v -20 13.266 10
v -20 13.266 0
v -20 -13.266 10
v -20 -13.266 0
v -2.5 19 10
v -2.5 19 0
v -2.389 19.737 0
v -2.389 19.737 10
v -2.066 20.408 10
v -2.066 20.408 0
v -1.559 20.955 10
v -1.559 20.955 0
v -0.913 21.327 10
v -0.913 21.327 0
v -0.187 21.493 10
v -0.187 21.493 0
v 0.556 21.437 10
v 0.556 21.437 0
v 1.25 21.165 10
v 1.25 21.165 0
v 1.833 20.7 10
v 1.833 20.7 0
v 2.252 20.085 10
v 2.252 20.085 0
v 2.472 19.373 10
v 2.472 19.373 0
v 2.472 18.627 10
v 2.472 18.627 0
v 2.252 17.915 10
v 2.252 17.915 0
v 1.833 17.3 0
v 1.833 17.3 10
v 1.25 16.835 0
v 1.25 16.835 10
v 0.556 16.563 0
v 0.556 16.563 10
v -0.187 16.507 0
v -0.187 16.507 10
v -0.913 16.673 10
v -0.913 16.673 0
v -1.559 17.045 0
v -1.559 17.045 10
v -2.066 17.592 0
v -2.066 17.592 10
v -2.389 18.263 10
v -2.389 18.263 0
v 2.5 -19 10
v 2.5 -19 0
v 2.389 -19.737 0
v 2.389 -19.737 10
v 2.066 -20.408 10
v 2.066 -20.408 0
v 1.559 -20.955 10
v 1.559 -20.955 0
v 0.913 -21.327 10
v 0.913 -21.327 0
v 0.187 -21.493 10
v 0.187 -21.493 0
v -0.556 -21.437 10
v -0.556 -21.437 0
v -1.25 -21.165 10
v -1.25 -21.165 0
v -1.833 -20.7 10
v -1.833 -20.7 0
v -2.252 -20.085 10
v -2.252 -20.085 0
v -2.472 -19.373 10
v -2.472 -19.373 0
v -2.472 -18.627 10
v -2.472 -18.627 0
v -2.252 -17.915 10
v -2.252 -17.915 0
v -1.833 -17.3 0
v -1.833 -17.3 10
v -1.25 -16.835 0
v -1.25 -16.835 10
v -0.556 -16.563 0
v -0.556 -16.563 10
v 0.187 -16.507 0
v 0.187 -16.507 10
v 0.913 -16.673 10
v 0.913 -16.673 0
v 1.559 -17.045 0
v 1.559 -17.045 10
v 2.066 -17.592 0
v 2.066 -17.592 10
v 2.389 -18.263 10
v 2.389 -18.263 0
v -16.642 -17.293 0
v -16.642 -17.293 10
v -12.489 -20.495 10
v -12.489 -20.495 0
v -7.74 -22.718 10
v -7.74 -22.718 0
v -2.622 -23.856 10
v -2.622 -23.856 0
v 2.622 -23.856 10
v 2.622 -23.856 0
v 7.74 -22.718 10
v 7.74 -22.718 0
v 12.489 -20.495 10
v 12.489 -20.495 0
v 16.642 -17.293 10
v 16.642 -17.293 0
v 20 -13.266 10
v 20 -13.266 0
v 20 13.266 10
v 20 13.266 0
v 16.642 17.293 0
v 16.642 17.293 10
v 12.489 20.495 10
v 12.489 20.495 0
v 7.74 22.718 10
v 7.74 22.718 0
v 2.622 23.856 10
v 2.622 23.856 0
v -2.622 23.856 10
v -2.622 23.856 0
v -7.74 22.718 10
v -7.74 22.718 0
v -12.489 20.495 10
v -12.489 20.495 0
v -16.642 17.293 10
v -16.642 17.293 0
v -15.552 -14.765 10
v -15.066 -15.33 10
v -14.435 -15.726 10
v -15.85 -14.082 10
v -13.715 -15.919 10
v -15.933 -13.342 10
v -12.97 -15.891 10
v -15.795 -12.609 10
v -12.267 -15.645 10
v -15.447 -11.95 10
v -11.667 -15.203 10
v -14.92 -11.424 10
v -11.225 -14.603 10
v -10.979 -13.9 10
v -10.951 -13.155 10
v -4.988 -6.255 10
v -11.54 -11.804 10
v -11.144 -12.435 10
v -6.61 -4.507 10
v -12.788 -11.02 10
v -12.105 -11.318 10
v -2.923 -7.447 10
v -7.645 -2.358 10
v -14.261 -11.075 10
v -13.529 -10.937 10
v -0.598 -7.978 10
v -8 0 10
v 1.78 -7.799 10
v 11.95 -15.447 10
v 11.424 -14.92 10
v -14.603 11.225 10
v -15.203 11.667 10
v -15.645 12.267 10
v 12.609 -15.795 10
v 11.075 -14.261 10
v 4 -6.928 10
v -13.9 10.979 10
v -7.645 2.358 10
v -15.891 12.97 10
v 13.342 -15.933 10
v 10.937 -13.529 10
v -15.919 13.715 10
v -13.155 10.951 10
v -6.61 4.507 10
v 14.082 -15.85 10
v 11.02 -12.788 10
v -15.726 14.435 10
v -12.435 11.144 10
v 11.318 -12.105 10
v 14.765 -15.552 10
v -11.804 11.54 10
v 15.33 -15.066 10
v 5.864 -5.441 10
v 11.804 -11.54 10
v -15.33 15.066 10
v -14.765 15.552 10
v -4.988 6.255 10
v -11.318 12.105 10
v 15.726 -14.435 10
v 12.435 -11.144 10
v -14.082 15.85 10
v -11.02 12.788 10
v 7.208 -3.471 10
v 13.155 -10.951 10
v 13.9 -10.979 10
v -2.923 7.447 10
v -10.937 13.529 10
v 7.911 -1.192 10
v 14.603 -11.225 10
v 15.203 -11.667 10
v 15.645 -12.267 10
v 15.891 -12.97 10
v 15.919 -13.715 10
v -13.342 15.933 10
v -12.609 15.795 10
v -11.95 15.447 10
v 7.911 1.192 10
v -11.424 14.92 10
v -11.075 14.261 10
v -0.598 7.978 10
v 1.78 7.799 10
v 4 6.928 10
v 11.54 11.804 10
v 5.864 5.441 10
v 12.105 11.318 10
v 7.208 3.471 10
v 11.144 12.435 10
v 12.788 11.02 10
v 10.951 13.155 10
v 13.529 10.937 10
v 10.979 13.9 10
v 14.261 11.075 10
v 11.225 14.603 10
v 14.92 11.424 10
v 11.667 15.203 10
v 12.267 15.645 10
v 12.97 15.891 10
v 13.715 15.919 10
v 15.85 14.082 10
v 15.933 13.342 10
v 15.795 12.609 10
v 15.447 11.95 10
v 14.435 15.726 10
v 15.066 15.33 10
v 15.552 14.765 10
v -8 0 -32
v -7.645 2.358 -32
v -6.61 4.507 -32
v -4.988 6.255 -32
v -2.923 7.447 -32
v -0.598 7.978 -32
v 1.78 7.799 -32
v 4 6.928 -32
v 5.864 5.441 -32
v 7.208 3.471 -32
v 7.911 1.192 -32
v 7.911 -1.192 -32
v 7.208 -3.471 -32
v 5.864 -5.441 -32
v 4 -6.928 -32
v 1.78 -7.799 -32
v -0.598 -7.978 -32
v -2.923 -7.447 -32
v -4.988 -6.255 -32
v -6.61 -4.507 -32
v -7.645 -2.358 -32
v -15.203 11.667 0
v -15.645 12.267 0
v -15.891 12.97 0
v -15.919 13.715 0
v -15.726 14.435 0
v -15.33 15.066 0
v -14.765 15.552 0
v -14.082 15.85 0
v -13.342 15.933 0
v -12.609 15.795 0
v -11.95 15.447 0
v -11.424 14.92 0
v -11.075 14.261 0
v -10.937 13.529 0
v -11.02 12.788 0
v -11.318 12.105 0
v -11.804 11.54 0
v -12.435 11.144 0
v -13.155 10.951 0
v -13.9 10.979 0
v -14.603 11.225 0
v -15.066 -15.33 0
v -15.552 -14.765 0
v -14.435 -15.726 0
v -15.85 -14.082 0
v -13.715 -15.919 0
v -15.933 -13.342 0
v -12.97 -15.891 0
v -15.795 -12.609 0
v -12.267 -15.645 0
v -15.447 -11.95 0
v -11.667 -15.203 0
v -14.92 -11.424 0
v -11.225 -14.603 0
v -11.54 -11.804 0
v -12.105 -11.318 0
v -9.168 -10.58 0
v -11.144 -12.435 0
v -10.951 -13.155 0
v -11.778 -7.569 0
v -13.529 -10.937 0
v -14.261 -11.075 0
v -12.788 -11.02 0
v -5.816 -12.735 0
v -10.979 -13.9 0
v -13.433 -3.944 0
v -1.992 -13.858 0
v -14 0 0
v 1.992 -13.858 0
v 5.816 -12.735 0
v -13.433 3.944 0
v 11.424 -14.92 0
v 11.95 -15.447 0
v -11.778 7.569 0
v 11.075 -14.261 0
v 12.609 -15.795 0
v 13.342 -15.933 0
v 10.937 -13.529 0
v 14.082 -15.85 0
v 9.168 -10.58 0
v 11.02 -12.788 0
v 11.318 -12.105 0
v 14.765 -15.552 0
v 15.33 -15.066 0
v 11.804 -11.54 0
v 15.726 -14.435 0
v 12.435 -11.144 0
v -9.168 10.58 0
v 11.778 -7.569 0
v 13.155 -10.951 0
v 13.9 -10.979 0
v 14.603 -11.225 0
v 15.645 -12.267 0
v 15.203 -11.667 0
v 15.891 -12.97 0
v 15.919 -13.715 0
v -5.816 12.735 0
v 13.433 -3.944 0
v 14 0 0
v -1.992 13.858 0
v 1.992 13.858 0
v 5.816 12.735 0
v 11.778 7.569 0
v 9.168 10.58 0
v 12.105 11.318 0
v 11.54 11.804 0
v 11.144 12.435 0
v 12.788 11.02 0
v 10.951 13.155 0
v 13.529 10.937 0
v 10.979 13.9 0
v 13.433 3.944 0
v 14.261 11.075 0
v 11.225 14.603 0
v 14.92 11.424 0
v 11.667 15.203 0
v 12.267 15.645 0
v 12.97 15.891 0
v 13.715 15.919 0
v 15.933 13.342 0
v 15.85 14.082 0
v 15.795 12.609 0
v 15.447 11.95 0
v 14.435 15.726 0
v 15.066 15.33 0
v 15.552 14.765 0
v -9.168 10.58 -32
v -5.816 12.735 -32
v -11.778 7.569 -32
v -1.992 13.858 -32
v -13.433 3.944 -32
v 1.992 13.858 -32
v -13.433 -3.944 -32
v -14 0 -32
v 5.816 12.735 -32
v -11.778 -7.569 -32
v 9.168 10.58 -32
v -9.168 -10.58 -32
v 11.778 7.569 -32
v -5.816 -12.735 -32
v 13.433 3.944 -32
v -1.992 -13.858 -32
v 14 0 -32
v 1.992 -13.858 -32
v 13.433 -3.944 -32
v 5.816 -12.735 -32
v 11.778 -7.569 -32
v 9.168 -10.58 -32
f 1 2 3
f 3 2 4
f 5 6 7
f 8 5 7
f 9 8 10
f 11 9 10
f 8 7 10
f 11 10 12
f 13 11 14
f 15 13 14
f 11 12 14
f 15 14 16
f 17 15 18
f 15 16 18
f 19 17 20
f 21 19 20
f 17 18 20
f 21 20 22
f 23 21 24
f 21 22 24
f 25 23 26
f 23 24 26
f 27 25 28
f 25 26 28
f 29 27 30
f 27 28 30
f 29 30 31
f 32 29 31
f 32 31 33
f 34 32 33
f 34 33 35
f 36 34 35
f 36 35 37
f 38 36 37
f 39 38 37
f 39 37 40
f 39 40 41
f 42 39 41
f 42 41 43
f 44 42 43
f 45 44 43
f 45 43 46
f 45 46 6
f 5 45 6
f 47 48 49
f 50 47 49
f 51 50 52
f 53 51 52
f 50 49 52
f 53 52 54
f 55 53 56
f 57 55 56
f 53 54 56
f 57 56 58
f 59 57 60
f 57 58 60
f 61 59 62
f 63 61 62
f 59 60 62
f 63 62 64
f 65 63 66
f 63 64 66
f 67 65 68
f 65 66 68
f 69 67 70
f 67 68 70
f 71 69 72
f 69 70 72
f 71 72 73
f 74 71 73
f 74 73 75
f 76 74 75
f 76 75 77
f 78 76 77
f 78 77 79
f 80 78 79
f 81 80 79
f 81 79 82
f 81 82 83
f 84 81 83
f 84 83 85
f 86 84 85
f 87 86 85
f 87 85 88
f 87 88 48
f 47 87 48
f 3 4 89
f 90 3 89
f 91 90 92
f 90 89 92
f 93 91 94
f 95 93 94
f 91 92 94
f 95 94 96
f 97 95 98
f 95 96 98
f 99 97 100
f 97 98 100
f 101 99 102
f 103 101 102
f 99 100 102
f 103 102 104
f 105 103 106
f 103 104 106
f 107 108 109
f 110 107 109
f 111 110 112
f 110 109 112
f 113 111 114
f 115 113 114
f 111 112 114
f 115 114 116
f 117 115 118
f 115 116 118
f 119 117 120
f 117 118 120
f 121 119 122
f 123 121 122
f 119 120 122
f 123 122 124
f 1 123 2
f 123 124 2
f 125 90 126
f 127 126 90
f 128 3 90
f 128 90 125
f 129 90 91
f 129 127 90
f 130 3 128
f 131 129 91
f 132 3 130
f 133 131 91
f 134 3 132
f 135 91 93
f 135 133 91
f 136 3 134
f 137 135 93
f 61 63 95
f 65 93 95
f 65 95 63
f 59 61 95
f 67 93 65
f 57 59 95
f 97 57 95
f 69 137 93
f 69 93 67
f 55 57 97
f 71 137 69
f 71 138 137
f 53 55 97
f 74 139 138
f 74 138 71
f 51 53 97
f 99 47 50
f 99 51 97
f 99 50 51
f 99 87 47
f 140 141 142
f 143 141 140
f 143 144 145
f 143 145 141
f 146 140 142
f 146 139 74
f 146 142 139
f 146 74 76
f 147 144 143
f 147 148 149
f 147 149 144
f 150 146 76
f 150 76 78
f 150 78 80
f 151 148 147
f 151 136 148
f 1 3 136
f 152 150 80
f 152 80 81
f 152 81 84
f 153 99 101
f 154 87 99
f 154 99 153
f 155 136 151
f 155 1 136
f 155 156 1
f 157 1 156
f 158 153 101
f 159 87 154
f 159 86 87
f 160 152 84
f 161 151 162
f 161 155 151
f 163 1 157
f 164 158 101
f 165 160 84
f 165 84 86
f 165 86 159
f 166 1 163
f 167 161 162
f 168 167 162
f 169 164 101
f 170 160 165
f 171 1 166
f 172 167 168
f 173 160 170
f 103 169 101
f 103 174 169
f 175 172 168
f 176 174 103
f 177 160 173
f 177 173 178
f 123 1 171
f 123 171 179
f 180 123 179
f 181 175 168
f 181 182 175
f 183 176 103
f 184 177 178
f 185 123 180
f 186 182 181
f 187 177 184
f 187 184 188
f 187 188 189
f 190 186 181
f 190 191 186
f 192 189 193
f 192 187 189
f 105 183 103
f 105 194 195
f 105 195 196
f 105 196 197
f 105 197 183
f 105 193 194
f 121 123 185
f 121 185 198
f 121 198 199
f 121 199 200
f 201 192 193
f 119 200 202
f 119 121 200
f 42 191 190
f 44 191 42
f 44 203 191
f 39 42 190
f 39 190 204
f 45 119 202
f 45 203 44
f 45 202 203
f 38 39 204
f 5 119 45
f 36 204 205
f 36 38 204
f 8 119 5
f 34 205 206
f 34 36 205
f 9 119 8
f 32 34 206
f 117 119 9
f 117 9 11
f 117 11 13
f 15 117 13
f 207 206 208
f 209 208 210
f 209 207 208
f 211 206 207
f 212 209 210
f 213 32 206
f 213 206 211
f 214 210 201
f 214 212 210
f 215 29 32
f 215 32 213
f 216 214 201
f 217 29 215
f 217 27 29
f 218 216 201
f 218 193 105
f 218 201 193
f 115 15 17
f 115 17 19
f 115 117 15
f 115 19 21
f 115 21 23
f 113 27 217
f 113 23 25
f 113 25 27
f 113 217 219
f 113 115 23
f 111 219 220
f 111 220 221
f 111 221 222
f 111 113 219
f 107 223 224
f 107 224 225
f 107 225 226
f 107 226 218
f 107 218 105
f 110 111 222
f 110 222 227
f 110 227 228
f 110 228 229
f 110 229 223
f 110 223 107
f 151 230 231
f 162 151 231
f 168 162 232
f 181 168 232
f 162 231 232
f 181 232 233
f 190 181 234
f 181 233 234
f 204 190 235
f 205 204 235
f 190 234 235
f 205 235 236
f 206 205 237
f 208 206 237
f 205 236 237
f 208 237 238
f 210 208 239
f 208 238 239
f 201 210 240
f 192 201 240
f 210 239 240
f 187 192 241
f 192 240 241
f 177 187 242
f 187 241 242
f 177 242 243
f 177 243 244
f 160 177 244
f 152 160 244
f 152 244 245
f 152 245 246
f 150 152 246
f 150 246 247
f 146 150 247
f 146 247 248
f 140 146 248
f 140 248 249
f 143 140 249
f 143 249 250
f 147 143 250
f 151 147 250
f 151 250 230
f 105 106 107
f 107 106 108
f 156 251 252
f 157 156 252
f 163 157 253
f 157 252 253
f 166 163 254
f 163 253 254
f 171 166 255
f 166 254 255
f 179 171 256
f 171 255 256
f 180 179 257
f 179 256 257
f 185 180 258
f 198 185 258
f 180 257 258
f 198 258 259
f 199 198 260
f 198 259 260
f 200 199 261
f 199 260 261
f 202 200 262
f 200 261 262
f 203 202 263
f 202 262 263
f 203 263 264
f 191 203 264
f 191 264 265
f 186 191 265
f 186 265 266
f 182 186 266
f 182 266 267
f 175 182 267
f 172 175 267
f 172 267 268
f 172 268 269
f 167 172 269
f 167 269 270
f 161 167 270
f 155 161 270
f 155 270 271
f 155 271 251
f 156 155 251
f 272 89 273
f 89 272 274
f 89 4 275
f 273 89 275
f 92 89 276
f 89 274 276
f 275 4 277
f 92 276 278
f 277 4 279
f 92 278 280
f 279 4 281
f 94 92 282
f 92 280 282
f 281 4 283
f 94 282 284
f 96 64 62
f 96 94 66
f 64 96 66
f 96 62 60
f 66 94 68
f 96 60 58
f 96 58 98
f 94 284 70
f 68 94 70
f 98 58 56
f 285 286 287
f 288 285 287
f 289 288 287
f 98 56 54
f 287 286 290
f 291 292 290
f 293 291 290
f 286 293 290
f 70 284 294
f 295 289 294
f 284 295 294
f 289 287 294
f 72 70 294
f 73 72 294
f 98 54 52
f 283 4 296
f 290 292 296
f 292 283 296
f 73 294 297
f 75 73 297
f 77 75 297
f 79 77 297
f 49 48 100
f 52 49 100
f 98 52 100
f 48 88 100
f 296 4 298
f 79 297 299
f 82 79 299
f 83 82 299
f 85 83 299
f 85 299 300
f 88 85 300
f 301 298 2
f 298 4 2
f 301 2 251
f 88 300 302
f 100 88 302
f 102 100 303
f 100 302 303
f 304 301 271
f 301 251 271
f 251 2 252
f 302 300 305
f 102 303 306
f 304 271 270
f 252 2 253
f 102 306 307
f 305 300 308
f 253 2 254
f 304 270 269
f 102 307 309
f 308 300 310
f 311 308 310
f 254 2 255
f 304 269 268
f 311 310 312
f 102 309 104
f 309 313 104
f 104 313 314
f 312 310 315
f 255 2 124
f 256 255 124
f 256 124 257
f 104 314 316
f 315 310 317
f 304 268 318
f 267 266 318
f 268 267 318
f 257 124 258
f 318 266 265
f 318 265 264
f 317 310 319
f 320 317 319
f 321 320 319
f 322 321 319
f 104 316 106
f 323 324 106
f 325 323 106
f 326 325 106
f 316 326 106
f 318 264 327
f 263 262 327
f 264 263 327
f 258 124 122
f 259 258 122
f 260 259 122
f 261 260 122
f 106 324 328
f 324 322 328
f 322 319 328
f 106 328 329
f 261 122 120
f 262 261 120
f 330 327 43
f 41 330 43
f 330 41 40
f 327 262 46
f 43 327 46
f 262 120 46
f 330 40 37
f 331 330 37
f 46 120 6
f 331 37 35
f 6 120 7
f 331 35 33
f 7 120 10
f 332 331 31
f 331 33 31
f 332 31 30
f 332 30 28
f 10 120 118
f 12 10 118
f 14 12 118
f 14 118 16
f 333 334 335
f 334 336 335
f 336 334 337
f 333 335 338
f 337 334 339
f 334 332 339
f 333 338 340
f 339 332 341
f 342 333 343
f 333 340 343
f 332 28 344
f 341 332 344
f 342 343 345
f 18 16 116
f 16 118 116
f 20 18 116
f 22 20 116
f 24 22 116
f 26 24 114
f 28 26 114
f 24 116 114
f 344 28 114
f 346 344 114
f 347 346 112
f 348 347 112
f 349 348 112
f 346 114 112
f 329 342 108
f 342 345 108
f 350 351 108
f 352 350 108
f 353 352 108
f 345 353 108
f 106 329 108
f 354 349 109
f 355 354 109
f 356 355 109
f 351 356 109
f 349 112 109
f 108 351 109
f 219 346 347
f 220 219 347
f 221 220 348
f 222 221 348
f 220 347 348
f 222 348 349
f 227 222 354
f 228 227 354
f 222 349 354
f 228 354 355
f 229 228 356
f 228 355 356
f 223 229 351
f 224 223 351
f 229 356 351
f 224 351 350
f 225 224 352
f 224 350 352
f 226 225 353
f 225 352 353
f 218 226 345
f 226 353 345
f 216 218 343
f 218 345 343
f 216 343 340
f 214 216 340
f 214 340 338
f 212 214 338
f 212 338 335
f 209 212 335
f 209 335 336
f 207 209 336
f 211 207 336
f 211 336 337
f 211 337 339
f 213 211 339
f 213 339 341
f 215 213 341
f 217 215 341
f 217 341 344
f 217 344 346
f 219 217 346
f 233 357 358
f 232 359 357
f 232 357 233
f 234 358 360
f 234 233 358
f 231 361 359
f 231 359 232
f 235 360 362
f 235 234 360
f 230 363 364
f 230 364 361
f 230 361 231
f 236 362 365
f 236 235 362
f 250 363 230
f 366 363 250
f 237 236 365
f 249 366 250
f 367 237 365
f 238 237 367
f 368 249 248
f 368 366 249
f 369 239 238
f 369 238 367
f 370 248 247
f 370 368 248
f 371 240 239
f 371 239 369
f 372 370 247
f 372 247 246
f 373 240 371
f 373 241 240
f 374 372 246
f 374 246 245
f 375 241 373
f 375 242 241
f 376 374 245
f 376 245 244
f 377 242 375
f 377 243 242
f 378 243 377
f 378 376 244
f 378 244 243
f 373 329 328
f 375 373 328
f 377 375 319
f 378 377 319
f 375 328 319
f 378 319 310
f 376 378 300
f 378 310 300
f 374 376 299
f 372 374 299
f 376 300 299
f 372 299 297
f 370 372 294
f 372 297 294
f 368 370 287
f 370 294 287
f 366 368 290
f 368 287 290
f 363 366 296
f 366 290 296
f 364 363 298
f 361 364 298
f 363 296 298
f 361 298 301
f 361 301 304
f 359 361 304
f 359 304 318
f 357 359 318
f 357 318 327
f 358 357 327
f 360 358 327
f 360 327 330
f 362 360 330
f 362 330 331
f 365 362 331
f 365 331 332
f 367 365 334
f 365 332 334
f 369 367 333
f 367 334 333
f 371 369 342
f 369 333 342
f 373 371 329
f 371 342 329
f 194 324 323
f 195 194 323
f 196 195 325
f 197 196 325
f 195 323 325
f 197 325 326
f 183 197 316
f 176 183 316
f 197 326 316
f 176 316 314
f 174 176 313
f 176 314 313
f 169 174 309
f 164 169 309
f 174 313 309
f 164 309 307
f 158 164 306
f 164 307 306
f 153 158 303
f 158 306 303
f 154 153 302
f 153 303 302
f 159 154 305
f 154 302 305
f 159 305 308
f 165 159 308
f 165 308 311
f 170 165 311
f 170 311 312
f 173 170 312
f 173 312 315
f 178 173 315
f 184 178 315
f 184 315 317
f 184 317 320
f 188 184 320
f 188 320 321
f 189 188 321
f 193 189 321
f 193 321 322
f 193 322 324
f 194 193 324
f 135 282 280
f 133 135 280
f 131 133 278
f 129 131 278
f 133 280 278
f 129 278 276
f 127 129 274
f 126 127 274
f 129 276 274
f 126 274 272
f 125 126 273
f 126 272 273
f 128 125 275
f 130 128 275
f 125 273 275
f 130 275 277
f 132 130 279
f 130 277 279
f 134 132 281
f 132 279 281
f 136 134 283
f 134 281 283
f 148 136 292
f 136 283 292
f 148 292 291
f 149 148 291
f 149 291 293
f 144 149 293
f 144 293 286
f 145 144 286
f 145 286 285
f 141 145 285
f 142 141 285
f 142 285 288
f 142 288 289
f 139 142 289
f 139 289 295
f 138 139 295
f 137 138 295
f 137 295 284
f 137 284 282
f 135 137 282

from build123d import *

# Parameters (mm, degrees)
BOSS_EXTRUDE1_DEPTH   = 10
SKETCH2_R             = 14
BOSS_EXTRUDE2_DEPTH   = 32
SKETCH3_R             = 8
CUT_EXTRUDE1_DEPTH    = 53.345009313
F_5_0MM_DOWEL_HOLE1_D = 5
CIRPATTERN1_COUNT     = 8


with BuildPart() as part:
    # Sketch1 → Boss-Extrude1 (new body)
    with BuildSketch(Plane.XY):
        with BuildLine():
            Line((-20, 13.266499161), (-20, -13.266499161))
            ThreePointArc((-20, -13.266499161), (0, -24), (20, -13.266499161))
            Line((20, -13.266499161), (20, 13.266499161))
            ThreePointArc((20, 13.266499161), (0, 24), (-20, 13.266499161))
        make_face()
    extrude(amount=BOSS_EXTRUDE1_DEPTH)

    # Sketch2 → Boss-Extrude2 (add)
    with BuildSketch(Plane(origin=(0, 0, 0), x_dir=(-1, 0, 0), z_dir=(0, 0, -1))):
        with Locations(Location((0, 0, 0), (0, 0, 180))):
            Circle(SKETCH2_R)
    extrude(amount=BOSS_EXTRUDE2_DEPTH)

    # Sketch3 → Cut-Extrude1 (cut, through all)
    with BuildSketch(Plane(origin=(0, 0, -32), x_dir=(-1, 0, 0), z_dir=(0, 0, -1))):
        Circle(SKETCH3_R)
    extrude(amount=-CUT_EXTRUDE1_DEPTH, mode=Mode.SUBTRACT)

    # Ø5.0mm Dowel Hole1 (through all)
    with Locations(Plane.XY.offset(10)):
        with Locations((0, 19)):
            f_5_0mm_dowel_hole1 = Hole(F_5_0MM_DOWEL_HOLE1_D / 2)

    # CirPattern1: Ø5.0mm Dowel Hole1 ×8 about axis, 2 skipped
    cirpattern1_axis = Axis((0, 0, 0), (0, 0, -1))
    add([f_5_0mm_dowel_hole1.rotate(cirpattern1_axis, i * 360 / CIRPATTERN1_COUNT) for i in range(1, CIRPATTERN1_COUNT) if i not in (2, 6)], mode=Mode.SUBTRACT)


solid = part.part
